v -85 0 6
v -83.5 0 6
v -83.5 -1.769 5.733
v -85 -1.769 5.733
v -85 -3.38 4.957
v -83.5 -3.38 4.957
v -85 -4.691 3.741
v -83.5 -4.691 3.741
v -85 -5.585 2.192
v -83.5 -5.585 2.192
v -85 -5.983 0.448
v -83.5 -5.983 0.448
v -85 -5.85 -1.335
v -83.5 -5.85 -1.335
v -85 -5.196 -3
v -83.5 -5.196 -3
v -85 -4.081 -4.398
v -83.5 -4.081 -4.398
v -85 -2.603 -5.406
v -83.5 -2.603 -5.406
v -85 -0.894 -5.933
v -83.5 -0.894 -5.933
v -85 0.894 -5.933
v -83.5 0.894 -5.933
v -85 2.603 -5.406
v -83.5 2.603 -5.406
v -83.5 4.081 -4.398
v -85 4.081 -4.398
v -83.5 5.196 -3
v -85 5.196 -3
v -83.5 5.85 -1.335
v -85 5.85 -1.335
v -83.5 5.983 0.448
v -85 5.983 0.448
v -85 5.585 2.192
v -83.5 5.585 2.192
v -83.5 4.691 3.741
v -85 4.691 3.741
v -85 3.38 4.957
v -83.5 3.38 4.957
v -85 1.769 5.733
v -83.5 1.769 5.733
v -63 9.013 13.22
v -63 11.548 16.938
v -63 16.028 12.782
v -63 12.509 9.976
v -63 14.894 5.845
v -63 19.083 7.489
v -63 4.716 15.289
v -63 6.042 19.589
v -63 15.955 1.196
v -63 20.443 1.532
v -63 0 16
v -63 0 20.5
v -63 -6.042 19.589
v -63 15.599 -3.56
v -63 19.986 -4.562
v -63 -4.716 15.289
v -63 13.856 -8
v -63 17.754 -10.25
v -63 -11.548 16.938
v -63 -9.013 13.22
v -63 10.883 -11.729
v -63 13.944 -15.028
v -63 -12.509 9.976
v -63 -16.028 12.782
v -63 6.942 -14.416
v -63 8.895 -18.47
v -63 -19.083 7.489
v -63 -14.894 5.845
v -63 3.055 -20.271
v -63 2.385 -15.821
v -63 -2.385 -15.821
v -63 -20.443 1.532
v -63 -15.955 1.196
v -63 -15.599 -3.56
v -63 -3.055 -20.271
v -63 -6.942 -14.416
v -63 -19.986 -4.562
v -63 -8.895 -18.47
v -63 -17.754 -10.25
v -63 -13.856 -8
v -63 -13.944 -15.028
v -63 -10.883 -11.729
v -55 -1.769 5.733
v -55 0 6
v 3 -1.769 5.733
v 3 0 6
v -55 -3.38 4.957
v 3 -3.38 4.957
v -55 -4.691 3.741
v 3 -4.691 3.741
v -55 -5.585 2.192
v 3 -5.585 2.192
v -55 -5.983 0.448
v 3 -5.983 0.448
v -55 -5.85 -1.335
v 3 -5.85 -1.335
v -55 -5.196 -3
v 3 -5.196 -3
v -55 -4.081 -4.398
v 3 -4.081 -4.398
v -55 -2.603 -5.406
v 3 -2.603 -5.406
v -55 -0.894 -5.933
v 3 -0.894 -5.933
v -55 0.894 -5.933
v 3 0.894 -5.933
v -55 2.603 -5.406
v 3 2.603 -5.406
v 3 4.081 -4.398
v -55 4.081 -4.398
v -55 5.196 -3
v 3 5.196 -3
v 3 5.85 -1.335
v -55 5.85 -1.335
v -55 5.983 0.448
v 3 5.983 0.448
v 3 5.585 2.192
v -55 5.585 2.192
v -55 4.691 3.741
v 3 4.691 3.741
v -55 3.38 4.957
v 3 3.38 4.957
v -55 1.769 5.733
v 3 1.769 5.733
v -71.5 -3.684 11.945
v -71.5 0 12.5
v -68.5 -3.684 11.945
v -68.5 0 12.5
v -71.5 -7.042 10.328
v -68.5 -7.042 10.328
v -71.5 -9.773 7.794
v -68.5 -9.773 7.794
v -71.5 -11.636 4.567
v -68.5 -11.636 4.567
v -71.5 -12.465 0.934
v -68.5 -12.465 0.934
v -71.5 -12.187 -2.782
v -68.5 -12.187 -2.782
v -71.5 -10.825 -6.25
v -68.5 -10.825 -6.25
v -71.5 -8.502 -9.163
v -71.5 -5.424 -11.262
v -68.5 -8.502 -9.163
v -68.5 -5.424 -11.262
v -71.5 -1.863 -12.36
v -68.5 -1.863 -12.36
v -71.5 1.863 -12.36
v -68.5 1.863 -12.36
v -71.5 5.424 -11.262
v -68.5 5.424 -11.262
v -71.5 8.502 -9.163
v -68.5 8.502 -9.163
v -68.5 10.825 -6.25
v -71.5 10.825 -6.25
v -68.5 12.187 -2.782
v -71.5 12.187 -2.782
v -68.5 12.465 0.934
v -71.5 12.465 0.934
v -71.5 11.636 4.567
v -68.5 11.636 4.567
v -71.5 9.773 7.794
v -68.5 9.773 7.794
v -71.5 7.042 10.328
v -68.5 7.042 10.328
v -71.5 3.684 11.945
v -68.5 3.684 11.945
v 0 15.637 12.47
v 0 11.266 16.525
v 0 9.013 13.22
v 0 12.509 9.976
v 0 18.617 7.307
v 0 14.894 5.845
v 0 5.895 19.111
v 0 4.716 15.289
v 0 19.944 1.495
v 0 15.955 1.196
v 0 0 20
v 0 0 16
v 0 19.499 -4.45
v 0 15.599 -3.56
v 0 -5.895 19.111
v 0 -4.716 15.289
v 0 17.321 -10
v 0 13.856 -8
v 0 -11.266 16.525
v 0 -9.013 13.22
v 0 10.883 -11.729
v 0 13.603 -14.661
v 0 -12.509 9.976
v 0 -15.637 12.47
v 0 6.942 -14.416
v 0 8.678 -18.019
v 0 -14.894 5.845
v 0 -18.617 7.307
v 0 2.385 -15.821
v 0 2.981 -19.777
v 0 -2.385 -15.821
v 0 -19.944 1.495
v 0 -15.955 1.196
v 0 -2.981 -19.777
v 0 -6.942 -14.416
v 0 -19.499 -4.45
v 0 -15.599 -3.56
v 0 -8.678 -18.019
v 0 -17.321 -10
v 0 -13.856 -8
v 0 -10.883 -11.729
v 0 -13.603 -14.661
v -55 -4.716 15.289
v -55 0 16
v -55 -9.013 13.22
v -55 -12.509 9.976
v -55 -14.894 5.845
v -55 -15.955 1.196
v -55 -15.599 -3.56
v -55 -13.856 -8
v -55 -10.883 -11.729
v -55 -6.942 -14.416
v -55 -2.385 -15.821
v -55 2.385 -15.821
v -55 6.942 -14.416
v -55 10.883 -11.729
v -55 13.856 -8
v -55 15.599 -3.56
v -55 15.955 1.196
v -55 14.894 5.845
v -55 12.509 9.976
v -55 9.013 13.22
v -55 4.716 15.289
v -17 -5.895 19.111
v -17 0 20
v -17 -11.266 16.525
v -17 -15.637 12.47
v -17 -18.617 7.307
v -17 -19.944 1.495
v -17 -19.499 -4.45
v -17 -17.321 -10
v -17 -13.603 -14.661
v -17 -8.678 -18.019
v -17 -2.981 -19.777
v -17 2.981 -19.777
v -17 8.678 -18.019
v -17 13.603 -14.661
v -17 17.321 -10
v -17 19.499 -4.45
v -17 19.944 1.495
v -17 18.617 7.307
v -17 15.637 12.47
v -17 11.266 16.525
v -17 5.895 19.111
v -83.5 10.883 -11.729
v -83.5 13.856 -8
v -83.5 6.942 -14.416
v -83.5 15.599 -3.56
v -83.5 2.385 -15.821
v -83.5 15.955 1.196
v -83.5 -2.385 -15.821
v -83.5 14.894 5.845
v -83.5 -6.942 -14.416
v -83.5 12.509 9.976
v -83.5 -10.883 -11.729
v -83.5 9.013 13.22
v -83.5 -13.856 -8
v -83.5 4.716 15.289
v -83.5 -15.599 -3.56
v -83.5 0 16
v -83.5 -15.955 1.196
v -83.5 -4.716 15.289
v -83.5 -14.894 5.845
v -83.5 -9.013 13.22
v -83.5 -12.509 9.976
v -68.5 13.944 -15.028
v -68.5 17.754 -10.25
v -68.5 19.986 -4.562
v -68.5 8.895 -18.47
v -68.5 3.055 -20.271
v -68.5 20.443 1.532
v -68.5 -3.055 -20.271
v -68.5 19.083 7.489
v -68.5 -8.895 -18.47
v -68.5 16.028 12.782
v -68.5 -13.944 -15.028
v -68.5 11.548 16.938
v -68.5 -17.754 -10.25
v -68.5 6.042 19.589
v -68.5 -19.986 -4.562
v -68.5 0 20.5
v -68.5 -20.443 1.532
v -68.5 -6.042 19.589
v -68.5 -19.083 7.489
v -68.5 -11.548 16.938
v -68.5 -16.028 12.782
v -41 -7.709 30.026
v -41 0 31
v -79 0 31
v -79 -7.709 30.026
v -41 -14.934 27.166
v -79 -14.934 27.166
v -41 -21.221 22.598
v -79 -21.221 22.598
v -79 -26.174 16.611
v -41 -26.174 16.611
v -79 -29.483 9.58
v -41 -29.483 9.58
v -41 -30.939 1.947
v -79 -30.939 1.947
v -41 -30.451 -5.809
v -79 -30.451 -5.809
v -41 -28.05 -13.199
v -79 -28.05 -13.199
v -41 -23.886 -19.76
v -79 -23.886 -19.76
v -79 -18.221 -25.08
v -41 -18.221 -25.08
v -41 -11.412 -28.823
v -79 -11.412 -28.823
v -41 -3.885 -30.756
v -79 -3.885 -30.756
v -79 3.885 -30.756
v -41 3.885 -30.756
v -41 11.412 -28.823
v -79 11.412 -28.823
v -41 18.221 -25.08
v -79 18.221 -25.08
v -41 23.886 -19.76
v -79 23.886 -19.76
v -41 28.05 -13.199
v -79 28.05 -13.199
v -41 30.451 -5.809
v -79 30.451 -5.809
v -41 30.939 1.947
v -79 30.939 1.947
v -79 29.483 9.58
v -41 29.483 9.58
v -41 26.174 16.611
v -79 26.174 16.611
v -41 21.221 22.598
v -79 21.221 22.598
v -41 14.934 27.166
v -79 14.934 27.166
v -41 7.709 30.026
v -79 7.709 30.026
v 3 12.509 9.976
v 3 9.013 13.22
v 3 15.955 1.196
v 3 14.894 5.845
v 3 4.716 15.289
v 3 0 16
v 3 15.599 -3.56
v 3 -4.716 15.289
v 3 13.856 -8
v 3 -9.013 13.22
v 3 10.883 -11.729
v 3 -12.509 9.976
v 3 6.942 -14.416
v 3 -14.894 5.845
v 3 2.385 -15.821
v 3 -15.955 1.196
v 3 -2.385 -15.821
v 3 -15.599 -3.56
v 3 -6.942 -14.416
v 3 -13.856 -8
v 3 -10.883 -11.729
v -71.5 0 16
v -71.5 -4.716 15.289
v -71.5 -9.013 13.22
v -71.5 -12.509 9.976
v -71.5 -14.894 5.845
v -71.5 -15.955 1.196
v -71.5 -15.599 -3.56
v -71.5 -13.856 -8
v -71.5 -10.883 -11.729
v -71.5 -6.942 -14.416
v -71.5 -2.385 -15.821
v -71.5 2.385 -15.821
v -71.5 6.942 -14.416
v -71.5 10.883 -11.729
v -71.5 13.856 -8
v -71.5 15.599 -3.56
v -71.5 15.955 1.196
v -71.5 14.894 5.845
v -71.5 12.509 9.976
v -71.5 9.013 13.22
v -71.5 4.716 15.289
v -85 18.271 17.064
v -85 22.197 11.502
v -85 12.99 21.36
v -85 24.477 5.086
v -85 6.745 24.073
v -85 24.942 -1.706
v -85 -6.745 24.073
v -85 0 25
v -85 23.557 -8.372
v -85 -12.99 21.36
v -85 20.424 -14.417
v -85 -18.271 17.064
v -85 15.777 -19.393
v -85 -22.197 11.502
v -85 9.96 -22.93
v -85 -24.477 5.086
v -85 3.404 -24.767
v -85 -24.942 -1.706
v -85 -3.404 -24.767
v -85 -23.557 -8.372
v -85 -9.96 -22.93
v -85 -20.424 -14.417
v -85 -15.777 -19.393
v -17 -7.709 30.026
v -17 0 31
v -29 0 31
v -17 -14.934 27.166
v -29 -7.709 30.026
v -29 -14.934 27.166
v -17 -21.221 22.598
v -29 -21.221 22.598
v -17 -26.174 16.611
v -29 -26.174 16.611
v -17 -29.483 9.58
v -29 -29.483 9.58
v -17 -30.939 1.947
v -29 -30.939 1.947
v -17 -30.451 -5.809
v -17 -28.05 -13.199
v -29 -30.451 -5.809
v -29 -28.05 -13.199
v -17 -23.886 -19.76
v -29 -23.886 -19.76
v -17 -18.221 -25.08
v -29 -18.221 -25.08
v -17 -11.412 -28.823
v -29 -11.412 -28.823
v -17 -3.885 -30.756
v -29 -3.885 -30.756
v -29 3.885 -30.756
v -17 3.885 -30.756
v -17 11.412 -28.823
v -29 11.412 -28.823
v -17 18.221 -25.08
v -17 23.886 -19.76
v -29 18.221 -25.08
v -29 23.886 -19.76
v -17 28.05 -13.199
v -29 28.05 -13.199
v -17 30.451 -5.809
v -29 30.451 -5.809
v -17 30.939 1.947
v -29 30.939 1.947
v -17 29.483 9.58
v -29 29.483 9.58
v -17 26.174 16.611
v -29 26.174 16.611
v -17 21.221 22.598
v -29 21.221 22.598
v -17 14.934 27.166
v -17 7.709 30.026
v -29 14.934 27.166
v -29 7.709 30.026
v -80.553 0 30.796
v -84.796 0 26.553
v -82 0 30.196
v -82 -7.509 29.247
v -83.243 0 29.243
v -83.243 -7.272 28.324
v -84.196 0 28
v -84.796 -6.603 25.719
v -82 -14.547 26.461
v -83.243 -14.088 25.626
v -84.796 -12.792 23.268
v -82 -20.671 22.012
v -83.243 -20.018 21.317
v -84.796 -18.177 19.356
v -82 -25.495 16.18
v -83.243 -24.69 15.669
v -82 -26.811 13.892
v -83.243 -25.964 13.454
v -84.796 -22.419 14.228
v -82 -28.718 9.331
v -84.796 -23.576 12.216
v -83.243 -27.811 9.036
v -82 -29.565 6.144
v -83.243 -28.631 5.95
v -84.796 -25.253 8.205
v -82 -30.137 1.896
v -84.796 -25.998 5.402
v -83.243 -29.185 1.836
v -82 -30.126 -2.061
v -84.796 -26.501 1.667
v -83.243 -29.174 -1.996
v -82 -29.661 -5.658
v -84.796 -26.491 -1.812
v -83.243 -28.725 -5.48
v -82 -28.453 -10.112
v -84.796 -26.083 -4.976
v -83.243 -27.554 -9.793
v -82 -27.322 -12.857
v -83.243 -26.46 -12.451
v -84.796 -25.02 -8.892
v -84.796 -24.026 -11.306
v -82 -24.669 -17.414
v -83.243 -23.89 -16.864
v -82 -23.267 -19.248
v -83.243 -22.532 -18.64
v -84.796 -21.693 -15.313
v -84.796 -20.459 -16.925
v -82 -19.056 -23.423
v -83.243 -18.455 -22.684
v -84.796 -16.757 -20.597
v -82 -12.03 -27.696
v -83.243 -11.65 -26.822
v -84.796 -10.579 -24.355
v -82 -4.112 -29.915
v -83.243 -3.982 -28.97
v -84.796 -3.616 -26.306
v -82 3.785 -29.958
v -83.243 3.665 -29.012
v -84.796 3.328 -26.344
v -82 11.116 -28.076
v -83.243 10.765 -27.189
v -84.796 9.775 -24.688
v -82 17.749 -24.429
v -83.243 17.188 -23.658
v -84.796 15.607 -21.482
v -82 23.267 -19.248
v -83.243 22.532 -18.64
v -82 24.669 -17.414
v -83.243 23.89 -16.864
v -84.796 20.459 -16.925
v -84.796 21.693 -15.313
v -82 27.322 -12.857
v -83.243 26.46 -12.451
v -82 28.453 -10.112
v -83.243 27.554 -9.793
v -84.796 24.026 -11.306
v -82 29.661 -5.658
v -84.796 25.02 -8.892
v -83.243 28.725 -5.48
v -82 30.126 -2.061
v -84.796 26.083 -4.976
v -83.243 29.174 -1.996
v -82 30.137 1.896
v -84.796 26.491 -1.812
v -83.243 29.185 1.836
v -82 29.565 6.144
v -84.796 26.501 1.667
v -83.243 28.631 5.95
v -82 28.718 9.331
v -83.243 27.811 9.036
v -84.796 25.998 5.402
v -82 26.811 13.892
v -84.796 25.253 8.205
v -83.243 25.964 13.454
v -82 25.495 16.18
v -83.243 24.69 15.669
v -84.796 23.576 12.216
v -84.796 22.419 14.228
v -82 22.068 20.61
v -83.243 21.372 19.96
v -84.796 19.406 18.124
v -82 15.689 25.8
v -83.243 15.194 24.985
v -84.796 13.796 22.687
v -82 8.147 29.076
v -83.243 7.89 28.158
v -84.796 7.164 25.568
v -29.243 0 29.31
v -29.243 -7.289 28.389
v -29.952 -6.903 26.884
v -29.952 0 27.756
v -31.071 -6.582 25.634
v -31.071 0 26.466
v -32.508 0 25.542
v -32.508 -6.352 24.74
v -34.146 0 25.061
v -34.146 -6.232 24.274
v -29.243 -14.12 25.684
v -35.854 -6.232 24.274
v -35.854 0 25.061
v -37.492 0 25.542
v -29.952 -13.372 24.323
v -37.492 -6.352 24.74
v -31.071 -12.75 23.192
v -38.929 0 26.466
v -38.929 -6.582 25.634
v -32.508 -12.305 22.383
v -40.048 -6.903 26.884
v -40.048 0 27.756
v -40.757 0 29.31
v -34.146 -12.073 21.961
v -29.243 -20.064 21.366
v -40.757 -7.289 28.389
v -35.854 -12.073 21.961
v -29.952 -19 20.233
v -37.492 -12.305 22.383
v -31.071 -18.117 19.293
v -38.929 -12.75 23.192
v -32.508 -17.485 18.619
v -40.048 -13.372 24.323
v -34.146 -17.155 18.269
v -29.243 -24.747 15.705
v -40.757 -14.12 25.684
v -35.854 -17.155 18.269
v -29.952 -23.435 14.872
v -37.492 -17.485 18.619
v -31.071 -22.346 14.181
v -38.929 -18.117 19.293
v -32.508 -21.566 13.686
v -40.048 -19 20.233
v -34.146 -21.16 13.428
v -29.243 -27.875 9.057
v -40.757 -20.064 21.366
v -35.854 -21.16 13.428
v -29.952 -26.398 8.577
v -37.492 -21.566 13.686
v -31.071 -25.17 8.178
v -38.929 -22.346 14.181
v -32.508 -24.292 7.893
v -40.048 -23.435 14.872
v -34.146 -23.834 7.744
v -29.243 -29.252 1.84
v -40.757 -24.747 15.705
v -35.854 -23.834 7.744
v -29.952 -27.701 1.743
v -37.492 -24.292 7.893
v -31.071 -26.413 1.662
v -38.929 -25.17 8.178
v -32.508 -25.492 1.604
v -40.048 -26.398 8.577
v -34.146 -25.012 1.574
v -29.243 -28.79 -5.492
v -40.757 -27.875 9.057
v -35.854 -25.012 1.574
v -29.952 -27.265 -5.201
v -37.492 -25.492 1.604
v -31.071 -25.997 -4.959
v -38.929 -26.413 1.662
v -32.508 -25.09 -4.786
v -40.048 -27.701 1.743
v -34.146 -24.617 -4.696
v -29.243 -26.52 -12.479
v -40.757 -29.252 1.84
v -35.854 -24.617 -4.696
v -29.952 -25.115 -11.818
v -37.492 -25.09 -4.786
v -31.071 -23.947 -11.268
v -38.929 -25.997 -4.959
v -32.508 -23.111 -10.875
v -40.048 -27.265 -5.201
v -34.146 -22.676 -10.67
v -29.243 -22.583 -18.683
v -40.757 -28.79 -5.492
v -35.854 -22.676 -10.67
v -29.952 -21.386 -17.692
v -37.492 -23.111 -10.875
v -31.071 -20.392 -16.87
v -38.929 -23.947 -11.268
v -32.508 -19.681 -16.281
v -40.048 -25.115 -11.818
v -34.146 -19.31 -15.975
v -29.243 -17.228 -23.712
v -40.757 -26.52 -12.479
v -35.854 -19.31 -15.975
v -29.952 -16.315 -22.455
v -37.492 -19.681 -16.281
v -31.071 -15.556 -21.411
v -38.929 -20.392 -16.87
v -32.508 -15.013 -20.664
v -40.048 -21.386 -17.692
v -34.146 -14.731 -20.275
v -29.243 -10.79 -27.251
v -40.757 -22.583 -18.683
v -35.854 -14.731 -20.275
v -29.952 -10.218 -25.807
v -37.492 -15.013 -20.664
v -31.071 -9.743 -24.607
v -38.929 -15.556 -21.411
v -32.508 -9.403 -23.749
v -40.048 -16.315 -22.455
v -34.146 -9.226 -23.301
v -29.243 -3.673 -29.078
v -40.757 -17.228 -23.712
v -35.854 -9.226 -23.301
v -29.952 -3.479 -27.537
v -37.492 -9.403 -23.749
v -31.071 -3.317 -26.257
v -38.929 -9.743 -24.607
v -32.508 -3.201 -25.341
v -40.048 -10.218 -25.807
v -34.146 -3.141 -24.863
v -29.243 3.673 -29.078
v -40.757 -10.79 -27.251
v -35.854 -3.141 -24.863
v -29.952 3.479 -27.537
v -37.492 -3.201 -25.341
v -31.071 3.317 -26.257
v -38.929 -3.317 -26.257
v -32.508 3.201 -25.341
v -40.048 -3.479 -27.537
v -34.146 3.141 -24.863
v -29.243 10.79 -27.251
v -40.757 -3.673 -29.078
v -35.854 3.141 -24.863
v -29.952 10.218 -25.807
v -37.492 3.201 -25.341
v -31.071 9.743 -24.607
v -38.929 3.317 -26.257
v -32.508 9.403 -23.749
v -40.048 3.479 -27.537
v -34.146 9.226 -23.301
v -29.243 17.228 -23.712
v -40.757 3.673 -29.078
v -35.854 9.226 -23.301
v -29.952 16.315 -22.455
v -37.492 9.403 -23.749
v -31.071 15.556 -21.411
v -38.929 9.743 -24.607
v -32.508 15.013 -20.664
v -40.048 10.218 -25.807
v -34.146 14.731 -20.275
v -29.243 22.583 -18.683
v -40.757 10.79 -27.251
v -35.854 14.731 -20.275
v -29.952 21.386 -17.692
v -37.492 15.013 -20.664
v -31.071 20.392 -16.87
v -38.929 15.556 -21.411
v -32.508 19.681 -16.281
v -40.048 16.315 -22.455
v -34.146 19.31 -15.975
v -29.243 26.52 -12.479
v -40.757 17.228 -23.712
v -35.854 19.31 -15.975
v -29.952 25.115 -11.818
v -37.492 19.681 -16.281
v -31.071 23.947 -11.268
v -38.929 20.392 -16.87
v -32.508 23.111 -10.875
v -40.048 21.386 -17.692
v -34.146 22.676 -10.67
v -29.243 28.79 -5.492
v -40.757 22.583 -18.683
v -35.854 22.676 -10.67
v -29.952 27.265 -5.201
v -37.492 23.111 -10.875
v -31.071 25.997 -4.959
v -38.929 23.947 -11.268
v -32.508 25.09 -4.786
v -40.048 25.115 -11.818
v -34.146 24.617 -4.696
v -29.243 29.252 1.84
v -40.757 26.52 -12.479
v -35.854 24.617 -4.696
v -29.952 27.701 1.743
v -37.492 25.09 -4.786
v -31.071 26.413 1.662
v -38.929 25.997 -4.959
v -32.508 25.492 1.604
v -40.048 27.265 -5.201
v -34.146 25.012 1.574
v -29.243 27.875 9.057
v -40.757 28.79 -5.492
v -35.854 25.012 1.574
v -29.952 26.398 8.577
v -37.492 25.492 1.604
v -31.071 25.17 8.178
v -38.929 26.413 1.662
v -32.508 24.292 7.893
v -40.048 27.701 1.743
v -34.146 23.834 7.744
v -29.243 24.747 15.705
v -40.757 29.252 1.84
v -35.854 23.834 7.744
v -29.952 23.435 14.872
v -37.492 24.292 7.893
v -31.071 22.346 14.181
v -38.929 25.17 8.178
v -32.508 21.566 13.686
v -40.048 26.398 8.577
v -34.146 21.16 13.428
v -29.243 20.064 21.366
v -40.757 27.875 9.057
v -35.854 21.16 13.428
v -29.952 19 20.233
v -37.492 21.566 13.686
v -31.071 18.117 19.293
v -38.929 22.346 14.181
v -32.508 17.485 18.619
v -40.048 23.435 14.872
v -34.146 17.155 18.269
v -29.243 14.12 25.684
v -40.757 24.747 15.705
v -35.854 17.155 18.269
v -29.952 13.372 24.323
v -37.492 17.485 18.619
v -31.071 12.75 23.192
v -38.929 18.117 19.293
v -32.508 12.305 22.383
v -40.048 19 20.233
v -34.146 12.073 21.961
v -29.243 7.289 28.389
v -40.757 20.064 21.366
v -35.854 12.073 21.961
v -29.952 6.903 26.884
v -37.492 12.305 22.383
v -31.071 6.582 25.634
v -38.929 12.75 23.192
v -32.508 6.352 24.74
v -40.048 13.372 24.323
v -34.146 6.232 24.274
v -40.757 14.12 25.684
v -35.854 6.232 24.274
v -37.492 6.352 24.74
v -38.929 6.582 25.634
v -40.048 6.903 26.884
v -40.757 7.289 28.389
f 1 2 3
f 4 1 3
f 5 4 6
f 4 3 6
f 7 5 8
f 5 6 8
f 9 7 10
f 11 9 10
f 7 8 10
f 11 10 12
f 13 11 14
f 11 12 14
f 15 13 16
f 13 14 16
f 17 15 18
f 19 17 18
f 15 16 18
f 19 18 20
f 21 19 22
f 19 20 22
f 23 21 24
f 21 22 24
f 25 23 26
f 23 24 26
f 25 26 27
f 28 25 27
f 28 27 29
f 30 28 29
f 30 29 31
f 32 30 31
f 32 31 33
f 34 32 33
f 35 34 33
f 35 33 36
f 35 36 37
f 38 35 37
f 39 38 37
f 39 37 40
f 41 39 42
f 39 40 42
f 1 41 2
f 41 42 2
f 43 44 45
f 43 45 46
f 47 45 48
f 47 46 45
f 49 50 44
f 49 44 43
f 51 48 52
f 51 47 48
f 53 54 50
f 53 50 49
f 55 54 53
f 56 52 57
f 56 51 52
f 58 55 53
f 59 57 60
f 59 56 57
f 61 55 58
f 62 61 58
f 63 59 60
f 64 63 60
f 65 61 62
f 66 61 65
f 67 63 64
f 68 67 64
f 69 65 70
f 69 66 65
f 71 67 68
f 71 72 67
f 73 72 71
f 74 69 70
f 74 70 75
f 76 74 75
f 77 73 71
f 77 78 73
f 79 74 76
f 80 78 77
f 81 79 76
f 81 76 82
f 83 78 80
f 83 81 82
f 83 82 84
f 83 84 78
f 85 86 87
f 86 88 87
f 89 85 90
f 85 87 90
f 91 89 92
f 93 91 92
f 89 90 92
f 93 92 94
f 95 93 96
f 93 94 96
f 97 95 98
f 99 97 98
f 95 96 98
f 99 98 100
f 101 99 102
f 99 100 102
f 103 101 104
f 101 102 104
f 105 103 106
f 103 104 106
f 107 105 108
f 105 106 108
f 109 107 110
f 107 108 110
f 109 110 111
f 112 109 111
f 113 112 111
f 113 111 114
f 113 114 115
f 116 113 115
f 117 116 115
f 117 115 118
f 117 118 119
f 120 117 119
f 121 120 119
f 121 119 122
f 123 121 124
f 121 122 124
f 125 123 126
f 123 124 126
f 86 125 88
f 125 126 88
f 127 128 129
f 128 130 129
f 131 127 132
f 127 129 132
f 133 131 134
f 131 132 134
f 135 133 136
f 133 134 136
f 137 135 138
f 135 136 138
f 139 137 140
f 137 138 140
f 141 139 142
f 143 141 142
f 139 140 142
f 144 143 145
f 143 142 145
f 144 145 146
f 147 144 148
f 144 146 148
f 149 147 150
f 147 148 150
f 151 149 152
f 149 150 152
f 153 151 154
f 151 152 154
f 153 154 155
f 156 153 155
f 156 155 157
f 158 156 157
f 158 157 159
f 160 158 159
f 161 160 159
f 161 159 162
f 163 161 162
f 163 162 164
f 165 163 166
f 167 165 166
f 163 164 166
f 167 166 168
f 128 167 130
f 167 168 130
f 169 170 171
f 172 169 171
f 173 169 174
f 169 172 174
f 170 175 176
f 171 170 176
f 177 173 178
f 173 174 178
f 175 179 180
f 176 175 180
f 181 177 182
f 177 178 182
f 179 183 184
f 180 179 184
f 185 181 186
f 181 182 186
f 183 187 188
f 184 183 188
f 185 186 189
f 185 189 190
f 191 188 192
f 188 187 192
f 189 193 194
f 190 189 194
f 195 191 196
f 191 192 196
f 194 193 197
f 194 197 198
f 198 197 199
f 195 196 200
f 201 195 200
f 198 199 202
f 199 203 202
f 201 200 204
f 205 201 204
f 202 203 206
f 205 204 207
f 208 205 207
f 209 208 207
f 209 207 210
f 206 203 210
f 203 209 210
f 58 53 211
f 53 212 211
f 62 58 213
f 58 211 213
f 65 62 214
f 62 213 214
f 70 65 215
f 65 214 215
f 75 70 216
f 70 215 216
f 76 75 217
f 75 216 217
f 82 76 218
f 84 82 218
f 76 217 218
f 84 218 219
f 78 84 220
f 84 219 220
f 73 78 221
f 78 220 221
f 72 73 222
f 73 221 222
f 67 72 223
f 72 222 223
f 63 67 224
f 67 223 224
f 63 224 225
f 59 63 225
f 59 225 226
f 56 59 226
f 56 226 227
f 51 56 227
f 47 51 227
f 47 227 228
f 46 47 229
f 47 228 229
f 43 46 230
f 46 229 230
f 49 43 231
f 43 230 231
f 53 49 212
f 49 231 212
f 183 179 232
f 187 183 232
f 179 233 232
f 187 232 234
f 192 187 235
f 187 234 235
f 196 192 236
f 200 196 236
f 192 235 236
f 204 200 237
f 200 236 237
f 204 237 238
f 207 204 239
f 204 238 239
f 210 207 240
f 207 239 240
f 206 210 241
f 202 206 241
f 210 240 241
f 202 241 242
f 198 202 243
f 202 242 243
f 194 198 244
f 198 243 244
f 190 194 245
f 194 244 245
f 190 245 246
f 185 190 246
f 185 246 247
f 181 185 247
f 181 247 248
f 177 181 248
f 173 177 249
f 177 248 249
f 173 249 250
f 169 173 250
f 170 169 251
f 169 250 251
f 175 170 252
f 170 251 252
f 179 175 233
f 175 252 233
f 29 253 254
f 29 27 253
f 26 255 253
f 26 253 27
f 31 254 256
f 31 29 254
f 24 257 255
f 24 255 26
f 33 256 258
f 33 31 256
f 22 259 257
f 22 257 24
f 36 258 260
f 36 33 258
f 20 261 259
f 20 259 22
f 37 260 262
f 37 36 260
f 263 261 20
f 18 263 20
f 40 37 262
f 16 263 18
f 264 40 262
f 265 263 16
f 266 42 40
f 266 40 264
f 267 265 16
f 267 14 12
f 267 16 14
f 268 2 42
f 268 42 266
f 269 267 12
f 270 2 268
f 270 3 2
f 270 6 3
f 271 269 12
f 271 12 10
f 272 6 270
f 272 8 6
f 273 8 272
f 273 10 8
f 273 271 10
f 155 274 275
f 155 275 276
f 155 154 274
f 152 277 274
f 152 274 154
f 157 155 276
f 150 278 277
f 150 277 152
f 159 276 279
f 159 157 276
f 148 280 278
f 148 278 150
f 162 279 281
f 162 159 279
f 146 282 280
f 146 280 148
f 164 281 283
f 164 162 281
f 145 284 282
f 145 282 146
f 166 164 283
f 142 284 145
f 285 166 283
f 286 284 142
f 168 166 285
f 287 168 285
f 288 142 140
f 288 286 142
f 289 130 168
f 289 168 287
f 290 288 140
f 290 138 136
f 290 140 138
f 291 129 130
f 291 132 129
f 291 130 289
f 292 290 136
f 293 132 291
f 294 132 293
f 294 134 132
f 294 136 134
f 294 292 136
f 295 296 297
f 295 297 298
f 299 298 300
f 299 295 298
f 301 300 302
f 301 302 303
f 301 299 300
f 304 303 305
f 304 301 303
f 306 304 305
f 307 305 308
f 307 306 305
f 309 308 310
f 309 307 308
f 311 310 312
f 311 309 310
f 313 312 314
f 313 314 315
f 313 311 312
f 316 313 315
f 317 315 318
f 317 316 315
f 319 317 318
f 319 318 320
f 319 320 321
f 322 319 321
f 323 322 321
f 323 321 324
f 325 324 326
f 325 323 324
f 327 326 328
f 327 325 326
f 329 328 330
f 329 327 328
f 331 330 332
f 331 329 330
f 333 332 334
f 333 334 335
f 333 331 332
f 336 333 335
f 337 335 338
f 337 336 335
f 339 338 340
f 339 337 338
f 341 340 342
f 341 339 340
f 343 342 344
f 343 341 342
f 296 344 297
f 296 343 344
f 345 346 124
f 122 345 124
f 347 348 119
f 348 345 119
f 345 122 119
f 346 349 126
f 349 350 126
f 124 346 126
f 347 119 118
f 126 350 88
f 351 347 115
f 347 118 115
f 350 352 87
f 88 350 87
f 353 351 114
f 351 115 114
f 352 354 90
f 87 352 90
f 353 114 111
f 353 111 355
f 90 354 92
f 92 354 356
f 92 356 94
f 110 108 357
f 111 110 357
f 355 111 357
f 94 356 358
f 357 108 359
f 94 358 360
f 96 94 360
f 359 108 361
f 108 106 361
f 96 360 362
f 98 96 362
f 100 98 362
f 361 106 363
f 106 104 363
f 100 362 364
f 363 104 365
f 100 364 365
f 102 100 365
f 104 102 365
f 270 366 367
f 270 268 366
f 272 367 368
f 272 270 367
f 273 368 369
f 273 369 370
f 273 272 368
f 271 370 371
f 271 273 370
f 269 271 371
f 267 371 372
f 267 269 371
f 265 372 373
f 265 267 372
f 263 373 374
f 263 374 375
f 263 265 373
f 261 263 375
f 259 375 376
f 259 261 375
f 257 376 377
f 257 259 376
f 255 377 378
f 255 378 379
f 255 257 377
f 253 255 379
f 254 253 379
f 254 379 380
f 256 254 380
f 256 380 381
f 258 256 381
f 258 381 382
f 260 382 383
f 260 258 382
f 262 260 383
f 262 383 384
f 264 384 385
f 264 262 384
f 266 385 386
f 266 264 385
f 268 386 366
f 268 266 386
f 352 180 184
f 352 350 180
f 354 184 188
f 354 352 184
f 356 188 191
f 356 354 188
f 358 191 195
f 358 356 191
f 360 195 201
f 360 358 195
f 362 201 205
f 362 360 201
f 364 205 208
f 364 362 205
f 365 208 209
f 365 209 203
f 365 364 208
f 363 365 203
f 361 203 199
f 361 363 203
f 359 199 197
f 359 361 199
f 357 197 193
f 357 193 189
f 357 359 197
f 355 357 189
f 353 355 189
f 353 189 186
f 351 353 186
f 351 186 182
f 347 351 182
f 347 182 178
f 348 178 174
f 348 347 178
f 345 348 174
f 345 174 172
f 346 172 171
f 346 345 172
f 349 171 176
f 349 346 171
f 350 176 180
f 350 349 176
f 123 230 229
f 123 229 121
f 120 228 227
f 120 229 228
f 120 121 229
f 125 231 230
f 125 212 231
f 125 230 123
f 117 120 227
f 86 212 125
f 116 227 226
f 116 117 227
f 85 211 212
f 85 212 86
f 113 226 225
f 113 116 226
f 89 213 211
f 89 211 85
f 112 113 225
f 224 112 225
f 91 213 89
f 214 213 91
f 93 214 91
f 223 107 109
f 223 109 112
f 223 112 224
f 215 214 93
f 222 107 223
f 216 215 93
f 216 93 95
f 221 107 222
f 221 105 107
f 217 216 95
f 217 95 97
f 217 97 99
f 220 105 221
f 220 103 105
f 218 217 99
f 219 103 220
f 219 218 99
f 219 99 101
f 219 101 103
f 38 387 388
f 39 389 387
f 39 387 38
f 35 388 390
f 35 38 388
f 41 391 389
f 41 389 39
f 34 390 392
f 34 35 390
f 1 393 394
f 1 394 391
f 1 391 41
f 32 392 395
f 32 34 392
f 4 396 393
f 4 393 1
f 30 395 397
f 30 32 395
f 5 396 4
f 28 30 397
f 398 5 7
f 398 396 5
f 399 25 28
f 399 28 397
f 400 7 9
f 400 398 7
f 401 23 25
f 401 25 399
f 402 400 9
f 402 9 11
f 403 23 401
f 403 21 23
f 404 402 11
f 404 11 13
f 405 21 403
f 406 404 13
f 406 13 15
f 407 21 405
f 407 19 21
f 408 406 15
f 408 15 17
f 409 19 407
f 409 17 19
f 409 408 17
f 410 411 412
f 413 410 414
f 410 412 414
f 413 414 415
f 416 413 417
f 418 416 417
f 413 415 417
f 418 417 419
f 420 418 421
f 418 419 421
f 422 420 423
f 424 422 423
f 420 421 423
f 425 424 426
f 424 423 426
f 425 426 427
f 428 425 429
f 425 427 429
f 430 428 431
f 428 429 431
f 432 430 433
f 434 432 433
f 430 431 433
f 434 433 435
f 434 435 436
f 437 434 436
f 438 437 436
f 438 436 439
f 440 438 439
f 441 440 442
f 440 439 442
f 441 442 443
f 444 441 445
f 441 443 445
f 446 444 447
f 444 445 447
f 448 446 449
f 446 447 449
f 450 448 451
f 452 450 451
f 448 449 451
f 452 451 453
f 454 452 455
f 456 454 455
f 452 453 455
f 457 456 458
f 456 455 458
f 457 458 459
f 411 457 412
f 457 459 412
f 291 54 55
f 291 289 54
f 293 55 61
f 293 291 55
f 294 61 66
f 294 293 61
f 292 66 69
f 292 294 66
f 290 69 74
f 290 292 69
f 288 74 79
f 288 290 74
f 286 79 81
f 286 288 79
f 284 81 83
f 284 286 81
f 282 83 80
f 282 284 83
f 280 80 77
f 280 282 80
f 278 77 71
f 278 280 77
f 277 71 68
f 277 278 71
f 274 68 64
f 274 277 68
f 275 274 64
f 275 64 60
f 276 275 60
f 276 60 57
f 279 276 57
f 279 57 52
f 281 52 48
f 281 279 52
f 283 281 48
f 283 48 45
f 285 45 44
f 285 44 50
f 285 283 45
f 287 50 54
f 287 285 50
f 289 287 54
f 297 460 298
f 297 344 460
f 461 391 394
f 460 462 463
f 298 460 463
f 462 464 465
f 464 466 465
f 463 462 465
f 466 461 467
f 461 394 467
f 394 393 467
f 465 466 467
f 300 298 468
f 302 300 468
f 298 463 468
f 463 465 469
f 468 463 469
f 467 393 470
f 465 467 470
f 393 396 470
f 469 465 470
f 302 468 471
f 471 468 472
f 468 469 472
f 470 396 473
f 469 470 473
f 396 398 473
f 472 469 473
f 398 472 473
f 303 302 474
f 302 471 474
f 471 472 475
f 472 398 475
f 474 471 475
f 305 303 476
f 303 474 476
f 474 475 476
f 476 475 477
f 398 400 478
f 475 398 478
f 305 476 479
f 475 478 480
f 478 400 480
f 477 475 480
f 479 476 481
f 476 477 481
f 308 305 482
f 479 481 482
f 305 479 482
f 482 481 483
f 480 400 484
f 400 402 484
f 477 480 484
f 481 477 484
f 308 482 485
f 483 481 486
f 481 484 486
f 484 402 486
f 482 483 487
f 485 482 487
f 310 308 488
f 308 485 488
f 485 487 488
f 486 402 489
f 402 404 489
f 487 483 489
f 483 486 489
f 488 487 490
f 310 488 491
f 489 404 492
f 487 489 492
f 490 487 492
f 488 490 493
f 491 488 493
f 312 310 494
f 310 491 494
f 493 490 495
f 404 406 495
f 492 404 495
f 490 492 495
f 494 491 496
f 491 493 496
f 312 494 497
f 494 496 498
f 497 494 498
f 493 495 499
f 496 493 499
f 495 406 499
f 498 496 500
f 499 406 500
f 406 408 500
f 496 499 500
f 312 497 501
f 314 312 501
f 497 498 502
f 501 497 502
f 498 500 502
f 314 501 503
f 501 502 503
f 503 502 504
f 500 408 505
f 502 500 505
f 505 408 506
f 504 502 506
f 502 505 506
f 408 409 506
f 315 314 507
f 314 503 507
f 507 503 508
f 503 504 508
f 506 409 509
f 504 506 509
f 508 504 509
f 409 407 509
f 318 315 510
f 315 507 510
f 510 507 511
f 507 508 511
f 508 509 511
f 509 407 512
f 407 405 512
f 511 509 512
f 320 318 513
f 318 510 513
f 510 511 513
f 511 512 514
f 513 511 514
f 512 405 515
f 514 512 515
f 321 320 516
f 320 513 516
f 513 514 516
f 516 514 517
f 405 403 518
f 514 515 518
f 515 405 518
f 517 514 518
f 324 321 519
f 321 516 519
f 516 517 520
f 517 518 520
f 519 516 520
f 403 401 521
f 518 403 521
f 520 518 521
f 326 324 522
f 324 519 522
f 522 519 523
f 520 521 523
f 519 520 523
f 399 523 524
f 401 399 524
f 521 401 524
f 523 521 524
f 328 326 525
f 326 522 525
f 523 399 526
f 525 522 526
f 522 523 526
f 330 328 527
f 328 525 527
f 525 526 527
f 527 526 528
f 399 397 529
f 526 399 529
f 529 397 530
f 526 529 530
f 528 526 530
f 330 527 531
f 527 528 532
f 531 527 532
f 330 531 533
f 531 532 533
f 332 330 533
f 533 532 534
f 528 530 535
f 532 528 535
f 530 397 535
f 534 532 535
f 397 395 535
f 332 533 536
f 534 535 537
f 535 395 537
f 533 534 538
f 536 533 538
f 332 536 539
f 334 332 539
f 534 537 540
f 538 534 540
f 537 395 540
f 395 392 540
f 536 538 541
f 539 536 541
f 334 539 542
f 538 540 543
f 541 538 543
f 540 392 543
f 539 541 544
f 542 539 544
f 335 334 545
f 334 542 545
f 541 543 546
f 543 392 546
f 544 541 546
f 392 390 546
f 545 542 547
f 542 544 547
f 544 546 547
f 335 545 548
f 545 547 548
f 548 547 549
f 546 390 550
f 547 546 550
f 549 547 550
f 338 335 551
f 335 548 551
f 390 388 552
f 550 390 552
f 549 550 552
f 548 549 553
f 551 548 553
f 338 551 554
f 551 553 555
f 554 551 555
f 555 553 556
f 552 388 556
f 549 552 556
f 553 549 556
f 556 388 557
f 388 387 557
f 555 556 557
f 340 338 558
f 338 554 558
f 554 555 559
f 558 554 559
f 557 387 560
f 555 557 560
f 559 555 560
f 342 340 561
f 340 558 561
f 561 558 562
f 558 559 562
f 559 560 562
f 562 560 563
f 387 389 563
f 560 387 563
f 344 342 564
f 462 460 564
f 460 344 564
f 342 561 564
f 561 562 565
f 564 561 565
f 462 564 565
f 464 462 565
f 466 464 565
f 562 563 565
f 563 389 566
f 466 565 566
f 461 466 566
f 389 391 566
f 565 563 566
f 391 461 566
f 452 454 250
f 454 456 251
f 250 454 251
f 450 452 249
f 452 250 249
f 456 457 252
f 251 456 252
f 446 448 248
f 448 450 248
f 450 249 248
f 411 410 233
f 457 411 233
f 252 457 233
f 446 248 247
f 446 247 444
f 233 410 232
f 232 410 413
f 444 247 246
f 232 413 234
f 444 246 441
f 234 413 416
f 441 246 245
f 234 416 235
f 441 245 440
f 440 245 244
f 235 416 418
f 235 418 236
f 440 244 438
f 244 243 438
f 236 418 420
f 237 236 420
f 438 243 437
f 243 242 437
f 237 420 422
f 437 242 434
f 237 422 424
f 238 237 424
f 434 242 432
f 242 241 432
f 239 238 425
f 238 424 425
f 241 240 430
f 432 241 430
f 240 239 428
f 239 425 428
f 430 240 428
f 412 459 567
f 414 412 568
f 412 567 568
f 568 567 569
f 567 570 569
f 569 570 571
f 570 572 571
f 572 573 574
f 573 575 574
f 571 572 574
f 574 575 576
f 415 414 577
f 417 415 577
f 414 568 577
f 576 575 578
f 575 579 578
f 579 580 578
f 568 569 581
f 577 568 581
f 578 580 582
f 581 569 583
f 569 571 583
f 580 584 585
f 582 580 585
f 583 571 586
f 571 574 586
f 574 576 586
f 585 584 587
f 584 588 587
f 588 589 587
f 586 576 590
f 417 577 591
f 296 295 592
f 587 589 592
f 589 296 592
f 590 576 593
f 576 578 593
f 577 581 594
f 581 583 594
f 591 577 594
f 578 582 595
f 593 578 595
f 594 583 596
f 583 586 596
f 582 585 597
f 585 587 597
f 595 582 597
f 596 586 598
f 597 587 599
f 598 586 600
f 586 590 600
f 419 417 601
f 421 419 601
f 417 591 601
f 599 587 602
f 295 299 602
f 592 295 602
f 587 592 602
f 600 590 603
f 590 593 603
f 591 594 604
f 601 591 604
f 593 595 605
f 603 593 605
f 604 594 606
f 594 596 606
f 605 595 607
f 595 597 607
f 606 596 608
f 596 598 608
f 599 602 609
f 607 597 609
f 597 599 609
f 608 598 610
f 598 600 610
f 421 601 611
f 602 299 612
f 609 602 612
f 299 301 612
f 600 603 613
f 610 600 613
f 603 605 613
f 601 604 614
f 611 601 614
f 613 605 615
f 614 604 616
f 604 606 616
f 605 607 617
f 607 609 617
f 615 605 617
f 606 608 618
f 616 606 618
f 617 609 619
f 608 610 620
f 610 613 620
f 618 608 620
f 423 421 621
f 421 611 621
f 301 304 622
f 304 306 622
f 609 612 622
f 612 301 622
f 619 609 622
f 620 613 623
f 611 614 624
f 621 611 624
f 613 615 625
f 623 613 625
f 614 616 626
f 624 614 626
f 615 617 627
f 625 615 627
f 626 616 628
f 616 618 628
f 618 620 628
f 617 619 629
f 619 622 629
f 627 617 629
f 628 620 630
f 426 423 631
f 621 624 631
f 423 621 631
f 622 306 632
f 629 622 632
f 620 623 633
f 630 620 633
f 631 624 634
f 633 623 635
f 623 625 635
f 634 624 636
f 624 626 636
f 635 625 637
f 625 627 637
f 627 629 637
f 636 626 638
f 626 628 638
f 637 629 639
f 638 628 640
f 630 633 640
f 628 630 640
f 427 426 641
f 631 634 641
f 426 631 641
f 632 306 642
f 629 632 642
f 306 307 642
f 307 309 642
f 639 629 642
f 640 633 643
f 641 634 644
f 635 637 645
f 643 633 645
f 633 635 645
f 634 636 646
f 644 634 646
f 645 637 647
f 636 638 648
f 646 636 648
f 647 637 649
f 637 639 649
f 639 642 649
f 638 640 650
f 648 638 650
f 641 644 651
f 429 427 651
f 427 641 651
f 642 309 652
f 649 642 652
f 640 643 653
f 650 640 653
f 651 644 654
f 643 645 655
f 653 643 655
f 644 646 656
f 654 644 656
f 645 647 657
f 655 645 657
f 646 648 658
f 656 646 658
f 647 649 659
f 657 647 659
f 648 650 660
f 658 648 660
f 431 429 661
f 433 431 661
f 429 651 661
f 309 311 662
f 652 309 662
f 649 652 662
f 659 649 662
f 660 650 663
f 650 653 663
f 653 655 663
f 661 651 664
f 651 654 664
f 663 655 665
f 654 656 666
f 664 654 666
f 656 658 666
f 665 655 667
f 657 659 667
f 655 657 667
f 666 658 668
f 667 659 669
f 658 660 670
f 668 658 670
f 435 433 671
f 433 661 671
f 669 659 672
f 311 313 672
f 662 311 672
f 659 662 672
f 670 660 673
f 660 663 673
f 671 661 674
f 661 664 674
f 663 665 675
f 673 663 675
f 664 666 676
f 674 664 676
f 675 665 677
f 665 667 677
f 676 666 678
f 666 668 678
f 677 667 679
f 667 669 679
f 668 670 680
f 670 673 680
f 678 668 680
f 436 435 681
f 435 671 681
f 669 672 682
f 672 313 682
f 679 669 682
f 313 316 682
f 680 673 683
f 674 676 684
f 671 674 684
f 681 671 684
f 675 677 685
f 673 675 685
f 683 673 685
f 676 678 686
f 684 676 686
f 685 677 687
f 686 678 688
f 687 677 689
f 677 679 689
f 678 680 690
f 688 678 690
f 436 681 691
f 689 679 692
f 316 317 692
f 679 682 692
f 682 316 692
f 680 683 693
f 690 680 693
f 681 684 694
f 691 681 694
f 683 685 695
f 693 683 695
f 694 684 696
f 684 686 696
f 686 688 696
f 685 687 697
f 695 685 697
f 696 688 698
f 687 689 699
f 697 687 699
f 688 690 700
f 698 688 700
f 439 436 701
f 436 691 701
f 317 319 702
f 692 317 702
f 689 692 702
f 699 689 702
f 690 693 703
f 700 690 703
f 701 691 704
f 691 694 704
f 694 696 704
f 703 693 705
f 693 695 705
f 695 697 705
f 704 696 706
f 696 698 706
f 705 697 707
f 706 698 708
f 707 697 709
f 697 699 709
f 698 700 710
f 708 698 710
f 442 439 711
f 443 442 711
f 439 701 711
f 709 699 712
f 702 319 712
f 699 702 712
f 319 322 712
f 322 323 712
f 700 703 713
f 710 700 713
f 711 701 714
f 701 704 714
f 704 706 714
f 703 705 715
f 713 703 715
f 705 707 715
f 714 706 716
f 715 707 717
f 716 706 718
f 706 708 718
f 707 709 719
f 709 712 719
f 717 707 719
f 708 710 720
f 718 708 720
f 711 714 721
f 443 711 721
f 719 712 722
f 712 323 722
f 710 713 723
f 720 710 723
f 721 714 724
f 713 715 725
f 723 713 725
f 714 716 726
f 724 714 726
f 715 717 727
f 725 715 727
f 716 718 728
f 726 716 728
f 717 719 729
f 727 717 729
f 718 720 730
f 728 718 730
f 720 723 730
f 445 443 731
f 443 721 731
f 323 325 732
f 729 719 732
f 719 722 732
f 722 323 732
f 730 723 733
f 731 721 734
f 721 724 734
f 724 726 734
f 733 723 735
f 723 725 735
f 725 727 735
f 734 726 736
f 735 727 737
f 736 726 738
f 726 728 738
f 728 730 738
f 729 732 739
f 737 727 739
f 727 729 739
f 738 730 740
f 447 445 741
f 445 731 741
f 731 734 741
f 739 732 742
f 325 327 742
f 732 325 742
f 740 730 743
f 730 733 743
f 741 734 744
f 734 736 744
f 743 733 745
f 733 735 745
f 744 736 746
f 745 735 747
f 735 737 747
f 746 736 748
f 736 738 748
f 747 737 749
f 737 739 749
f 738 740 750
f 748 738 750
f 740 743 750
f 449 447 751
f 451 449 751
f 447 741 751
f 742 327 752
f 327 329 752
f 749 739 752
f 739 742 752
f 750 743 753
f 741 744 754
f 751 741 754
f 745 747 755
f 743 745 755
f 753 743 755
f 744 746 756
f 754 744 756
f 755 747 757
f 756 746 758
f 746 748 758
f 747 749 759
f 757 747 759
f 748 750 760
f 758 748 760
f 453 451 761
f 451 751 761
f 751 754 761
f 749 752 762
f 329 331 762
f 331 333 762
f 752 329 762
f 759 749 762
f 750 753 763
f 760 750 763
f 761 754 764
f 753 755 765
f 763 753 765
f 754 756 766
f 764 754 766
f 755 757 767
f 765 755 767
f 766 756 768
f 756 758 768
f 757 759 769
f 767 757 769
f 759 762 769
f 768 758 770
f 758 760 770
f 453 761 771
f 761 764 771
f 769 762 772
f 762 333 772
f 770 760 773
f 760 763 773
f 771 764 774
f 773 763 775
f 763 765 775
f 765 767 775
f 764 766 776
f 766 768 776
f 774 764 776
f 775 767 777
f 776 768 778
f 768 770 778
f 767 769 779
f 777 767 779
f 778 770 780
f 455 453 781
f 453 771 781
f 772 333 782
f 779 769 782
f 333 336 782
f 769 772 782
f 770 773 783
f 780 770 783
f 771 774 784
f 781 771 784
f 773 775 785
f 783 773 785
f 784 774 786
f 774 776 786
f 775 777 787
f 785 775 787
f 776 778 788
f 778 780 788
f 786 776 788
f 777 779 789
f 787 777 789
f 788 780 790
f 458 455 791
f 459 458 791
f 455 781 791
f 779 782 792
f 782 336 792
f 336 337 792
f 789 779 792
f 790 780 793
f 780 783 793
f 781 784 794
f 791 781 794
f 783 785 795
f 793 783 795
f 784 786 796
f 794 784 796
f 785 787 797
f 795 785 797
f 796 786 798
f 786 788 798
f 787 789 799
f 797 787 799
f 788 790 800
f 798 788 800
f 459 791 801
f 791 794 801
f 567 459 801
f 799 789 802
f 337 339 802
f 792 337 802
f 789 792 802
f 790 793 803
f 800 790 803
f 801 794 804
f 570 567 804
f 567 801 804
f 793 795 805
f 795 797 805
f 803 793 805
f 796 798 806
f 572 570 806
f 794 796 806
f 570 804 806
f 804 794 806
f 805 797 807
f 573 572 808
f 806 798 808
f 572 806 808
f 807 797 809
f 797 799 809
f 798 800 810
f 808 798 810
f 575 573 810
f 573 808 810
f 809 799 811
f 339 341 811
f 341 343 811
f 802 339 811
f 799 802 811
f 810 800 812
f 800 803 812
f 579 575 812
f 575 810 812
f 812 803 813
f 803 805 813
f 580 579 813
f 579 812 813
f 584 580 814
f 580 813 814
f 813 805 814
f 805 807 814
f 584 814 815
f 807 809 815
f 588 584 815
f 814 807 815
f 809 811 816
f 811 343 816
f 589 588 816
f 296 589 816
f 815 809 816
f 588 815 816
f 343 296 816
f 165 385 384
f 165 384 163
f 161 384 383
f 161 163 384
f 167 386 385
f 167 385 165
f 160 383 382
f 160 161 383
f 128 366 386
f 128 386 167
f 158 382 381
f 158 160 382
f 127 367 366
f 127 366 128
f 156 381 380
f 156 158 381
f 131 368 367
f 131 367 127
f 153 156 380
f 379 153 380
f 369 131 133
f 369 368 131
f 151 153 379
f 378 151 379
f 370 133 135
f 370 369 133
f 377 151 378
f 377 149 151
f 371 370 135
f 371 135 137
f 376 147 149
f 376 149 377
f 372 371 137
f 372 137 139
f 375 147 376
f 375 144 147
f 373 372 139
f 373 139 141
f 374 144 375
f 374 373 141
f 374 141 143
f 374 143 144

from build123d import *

# Parameters (mm, degrees)
F0_W   = 3
F0_H   = 10
F0_W_2 = 44
F0_H_2 = 25
F2_R   = 6
F3_W   = 3
F3_H   = 6.5
F3_W_2 = 8
F3_H_2 = 10


with BuildPart() as f1:
    # F0 (on Front) → F1 (revolve)
    with BuildSketch(Plane.XZ):
        with Locations((1.5, 11)):
            Rectangle(F0_W, F0_H)
        Polygon((-17, 6), (0, 6), (0, 16), (0, 20), (-17, 20), align=None)
        Polygon((-29, 6), (-17, 6), (-17, 20), (-17, 31), (-29, 31), align=None)
        with BuildLine():
            Line((-41, 6), (-29, 6))
            Line((-29, 6), (-29, 31))
            ThreePointArc((-29, 31), (-35, 25), (-41, 31))
            Line((-41, 31), (-41, 6))
        make_face()
        with Locations((-63, 18.5)):
            Rectangle(F0_W_2, F0_H_2)
    revolve(axis=Axis((-0.275247, 0, 0), (1, 0, 0)))

    # F2
    f2_edges = [f1.edges().sort_by_distance(p)[0] for p in [
        (-85, 0, -31),
    ]]
    fillet(f2_edges, radius=F2_R)

    # F3 (on Front) → F4 (revolve, cut)
    with BuildSketch(Plane.XZ):
        Polygon((-71.5, 16), (-83.5, 16), (-83.5, 6), (-71.5, 6), (-71.5, 12.5), align=None)
        with Locations((-70, 9.25)):
            Rectangle(F3_W, F3_H)
        Polygon((-68.5, 12.5), (-68.5, 6), (-63, 6), (-63, 16), (-63, 20.5), (-68.5, 20.5), align=None)
        with Locations((-59, 11)):
            Rectangle(F3_W_2, F3_H_2)
    revolve(axis=Axis((-38.937337, 0, 0), (1, 0, 0)), mode=Mode.SUBTRACT)


solid = f1.part
